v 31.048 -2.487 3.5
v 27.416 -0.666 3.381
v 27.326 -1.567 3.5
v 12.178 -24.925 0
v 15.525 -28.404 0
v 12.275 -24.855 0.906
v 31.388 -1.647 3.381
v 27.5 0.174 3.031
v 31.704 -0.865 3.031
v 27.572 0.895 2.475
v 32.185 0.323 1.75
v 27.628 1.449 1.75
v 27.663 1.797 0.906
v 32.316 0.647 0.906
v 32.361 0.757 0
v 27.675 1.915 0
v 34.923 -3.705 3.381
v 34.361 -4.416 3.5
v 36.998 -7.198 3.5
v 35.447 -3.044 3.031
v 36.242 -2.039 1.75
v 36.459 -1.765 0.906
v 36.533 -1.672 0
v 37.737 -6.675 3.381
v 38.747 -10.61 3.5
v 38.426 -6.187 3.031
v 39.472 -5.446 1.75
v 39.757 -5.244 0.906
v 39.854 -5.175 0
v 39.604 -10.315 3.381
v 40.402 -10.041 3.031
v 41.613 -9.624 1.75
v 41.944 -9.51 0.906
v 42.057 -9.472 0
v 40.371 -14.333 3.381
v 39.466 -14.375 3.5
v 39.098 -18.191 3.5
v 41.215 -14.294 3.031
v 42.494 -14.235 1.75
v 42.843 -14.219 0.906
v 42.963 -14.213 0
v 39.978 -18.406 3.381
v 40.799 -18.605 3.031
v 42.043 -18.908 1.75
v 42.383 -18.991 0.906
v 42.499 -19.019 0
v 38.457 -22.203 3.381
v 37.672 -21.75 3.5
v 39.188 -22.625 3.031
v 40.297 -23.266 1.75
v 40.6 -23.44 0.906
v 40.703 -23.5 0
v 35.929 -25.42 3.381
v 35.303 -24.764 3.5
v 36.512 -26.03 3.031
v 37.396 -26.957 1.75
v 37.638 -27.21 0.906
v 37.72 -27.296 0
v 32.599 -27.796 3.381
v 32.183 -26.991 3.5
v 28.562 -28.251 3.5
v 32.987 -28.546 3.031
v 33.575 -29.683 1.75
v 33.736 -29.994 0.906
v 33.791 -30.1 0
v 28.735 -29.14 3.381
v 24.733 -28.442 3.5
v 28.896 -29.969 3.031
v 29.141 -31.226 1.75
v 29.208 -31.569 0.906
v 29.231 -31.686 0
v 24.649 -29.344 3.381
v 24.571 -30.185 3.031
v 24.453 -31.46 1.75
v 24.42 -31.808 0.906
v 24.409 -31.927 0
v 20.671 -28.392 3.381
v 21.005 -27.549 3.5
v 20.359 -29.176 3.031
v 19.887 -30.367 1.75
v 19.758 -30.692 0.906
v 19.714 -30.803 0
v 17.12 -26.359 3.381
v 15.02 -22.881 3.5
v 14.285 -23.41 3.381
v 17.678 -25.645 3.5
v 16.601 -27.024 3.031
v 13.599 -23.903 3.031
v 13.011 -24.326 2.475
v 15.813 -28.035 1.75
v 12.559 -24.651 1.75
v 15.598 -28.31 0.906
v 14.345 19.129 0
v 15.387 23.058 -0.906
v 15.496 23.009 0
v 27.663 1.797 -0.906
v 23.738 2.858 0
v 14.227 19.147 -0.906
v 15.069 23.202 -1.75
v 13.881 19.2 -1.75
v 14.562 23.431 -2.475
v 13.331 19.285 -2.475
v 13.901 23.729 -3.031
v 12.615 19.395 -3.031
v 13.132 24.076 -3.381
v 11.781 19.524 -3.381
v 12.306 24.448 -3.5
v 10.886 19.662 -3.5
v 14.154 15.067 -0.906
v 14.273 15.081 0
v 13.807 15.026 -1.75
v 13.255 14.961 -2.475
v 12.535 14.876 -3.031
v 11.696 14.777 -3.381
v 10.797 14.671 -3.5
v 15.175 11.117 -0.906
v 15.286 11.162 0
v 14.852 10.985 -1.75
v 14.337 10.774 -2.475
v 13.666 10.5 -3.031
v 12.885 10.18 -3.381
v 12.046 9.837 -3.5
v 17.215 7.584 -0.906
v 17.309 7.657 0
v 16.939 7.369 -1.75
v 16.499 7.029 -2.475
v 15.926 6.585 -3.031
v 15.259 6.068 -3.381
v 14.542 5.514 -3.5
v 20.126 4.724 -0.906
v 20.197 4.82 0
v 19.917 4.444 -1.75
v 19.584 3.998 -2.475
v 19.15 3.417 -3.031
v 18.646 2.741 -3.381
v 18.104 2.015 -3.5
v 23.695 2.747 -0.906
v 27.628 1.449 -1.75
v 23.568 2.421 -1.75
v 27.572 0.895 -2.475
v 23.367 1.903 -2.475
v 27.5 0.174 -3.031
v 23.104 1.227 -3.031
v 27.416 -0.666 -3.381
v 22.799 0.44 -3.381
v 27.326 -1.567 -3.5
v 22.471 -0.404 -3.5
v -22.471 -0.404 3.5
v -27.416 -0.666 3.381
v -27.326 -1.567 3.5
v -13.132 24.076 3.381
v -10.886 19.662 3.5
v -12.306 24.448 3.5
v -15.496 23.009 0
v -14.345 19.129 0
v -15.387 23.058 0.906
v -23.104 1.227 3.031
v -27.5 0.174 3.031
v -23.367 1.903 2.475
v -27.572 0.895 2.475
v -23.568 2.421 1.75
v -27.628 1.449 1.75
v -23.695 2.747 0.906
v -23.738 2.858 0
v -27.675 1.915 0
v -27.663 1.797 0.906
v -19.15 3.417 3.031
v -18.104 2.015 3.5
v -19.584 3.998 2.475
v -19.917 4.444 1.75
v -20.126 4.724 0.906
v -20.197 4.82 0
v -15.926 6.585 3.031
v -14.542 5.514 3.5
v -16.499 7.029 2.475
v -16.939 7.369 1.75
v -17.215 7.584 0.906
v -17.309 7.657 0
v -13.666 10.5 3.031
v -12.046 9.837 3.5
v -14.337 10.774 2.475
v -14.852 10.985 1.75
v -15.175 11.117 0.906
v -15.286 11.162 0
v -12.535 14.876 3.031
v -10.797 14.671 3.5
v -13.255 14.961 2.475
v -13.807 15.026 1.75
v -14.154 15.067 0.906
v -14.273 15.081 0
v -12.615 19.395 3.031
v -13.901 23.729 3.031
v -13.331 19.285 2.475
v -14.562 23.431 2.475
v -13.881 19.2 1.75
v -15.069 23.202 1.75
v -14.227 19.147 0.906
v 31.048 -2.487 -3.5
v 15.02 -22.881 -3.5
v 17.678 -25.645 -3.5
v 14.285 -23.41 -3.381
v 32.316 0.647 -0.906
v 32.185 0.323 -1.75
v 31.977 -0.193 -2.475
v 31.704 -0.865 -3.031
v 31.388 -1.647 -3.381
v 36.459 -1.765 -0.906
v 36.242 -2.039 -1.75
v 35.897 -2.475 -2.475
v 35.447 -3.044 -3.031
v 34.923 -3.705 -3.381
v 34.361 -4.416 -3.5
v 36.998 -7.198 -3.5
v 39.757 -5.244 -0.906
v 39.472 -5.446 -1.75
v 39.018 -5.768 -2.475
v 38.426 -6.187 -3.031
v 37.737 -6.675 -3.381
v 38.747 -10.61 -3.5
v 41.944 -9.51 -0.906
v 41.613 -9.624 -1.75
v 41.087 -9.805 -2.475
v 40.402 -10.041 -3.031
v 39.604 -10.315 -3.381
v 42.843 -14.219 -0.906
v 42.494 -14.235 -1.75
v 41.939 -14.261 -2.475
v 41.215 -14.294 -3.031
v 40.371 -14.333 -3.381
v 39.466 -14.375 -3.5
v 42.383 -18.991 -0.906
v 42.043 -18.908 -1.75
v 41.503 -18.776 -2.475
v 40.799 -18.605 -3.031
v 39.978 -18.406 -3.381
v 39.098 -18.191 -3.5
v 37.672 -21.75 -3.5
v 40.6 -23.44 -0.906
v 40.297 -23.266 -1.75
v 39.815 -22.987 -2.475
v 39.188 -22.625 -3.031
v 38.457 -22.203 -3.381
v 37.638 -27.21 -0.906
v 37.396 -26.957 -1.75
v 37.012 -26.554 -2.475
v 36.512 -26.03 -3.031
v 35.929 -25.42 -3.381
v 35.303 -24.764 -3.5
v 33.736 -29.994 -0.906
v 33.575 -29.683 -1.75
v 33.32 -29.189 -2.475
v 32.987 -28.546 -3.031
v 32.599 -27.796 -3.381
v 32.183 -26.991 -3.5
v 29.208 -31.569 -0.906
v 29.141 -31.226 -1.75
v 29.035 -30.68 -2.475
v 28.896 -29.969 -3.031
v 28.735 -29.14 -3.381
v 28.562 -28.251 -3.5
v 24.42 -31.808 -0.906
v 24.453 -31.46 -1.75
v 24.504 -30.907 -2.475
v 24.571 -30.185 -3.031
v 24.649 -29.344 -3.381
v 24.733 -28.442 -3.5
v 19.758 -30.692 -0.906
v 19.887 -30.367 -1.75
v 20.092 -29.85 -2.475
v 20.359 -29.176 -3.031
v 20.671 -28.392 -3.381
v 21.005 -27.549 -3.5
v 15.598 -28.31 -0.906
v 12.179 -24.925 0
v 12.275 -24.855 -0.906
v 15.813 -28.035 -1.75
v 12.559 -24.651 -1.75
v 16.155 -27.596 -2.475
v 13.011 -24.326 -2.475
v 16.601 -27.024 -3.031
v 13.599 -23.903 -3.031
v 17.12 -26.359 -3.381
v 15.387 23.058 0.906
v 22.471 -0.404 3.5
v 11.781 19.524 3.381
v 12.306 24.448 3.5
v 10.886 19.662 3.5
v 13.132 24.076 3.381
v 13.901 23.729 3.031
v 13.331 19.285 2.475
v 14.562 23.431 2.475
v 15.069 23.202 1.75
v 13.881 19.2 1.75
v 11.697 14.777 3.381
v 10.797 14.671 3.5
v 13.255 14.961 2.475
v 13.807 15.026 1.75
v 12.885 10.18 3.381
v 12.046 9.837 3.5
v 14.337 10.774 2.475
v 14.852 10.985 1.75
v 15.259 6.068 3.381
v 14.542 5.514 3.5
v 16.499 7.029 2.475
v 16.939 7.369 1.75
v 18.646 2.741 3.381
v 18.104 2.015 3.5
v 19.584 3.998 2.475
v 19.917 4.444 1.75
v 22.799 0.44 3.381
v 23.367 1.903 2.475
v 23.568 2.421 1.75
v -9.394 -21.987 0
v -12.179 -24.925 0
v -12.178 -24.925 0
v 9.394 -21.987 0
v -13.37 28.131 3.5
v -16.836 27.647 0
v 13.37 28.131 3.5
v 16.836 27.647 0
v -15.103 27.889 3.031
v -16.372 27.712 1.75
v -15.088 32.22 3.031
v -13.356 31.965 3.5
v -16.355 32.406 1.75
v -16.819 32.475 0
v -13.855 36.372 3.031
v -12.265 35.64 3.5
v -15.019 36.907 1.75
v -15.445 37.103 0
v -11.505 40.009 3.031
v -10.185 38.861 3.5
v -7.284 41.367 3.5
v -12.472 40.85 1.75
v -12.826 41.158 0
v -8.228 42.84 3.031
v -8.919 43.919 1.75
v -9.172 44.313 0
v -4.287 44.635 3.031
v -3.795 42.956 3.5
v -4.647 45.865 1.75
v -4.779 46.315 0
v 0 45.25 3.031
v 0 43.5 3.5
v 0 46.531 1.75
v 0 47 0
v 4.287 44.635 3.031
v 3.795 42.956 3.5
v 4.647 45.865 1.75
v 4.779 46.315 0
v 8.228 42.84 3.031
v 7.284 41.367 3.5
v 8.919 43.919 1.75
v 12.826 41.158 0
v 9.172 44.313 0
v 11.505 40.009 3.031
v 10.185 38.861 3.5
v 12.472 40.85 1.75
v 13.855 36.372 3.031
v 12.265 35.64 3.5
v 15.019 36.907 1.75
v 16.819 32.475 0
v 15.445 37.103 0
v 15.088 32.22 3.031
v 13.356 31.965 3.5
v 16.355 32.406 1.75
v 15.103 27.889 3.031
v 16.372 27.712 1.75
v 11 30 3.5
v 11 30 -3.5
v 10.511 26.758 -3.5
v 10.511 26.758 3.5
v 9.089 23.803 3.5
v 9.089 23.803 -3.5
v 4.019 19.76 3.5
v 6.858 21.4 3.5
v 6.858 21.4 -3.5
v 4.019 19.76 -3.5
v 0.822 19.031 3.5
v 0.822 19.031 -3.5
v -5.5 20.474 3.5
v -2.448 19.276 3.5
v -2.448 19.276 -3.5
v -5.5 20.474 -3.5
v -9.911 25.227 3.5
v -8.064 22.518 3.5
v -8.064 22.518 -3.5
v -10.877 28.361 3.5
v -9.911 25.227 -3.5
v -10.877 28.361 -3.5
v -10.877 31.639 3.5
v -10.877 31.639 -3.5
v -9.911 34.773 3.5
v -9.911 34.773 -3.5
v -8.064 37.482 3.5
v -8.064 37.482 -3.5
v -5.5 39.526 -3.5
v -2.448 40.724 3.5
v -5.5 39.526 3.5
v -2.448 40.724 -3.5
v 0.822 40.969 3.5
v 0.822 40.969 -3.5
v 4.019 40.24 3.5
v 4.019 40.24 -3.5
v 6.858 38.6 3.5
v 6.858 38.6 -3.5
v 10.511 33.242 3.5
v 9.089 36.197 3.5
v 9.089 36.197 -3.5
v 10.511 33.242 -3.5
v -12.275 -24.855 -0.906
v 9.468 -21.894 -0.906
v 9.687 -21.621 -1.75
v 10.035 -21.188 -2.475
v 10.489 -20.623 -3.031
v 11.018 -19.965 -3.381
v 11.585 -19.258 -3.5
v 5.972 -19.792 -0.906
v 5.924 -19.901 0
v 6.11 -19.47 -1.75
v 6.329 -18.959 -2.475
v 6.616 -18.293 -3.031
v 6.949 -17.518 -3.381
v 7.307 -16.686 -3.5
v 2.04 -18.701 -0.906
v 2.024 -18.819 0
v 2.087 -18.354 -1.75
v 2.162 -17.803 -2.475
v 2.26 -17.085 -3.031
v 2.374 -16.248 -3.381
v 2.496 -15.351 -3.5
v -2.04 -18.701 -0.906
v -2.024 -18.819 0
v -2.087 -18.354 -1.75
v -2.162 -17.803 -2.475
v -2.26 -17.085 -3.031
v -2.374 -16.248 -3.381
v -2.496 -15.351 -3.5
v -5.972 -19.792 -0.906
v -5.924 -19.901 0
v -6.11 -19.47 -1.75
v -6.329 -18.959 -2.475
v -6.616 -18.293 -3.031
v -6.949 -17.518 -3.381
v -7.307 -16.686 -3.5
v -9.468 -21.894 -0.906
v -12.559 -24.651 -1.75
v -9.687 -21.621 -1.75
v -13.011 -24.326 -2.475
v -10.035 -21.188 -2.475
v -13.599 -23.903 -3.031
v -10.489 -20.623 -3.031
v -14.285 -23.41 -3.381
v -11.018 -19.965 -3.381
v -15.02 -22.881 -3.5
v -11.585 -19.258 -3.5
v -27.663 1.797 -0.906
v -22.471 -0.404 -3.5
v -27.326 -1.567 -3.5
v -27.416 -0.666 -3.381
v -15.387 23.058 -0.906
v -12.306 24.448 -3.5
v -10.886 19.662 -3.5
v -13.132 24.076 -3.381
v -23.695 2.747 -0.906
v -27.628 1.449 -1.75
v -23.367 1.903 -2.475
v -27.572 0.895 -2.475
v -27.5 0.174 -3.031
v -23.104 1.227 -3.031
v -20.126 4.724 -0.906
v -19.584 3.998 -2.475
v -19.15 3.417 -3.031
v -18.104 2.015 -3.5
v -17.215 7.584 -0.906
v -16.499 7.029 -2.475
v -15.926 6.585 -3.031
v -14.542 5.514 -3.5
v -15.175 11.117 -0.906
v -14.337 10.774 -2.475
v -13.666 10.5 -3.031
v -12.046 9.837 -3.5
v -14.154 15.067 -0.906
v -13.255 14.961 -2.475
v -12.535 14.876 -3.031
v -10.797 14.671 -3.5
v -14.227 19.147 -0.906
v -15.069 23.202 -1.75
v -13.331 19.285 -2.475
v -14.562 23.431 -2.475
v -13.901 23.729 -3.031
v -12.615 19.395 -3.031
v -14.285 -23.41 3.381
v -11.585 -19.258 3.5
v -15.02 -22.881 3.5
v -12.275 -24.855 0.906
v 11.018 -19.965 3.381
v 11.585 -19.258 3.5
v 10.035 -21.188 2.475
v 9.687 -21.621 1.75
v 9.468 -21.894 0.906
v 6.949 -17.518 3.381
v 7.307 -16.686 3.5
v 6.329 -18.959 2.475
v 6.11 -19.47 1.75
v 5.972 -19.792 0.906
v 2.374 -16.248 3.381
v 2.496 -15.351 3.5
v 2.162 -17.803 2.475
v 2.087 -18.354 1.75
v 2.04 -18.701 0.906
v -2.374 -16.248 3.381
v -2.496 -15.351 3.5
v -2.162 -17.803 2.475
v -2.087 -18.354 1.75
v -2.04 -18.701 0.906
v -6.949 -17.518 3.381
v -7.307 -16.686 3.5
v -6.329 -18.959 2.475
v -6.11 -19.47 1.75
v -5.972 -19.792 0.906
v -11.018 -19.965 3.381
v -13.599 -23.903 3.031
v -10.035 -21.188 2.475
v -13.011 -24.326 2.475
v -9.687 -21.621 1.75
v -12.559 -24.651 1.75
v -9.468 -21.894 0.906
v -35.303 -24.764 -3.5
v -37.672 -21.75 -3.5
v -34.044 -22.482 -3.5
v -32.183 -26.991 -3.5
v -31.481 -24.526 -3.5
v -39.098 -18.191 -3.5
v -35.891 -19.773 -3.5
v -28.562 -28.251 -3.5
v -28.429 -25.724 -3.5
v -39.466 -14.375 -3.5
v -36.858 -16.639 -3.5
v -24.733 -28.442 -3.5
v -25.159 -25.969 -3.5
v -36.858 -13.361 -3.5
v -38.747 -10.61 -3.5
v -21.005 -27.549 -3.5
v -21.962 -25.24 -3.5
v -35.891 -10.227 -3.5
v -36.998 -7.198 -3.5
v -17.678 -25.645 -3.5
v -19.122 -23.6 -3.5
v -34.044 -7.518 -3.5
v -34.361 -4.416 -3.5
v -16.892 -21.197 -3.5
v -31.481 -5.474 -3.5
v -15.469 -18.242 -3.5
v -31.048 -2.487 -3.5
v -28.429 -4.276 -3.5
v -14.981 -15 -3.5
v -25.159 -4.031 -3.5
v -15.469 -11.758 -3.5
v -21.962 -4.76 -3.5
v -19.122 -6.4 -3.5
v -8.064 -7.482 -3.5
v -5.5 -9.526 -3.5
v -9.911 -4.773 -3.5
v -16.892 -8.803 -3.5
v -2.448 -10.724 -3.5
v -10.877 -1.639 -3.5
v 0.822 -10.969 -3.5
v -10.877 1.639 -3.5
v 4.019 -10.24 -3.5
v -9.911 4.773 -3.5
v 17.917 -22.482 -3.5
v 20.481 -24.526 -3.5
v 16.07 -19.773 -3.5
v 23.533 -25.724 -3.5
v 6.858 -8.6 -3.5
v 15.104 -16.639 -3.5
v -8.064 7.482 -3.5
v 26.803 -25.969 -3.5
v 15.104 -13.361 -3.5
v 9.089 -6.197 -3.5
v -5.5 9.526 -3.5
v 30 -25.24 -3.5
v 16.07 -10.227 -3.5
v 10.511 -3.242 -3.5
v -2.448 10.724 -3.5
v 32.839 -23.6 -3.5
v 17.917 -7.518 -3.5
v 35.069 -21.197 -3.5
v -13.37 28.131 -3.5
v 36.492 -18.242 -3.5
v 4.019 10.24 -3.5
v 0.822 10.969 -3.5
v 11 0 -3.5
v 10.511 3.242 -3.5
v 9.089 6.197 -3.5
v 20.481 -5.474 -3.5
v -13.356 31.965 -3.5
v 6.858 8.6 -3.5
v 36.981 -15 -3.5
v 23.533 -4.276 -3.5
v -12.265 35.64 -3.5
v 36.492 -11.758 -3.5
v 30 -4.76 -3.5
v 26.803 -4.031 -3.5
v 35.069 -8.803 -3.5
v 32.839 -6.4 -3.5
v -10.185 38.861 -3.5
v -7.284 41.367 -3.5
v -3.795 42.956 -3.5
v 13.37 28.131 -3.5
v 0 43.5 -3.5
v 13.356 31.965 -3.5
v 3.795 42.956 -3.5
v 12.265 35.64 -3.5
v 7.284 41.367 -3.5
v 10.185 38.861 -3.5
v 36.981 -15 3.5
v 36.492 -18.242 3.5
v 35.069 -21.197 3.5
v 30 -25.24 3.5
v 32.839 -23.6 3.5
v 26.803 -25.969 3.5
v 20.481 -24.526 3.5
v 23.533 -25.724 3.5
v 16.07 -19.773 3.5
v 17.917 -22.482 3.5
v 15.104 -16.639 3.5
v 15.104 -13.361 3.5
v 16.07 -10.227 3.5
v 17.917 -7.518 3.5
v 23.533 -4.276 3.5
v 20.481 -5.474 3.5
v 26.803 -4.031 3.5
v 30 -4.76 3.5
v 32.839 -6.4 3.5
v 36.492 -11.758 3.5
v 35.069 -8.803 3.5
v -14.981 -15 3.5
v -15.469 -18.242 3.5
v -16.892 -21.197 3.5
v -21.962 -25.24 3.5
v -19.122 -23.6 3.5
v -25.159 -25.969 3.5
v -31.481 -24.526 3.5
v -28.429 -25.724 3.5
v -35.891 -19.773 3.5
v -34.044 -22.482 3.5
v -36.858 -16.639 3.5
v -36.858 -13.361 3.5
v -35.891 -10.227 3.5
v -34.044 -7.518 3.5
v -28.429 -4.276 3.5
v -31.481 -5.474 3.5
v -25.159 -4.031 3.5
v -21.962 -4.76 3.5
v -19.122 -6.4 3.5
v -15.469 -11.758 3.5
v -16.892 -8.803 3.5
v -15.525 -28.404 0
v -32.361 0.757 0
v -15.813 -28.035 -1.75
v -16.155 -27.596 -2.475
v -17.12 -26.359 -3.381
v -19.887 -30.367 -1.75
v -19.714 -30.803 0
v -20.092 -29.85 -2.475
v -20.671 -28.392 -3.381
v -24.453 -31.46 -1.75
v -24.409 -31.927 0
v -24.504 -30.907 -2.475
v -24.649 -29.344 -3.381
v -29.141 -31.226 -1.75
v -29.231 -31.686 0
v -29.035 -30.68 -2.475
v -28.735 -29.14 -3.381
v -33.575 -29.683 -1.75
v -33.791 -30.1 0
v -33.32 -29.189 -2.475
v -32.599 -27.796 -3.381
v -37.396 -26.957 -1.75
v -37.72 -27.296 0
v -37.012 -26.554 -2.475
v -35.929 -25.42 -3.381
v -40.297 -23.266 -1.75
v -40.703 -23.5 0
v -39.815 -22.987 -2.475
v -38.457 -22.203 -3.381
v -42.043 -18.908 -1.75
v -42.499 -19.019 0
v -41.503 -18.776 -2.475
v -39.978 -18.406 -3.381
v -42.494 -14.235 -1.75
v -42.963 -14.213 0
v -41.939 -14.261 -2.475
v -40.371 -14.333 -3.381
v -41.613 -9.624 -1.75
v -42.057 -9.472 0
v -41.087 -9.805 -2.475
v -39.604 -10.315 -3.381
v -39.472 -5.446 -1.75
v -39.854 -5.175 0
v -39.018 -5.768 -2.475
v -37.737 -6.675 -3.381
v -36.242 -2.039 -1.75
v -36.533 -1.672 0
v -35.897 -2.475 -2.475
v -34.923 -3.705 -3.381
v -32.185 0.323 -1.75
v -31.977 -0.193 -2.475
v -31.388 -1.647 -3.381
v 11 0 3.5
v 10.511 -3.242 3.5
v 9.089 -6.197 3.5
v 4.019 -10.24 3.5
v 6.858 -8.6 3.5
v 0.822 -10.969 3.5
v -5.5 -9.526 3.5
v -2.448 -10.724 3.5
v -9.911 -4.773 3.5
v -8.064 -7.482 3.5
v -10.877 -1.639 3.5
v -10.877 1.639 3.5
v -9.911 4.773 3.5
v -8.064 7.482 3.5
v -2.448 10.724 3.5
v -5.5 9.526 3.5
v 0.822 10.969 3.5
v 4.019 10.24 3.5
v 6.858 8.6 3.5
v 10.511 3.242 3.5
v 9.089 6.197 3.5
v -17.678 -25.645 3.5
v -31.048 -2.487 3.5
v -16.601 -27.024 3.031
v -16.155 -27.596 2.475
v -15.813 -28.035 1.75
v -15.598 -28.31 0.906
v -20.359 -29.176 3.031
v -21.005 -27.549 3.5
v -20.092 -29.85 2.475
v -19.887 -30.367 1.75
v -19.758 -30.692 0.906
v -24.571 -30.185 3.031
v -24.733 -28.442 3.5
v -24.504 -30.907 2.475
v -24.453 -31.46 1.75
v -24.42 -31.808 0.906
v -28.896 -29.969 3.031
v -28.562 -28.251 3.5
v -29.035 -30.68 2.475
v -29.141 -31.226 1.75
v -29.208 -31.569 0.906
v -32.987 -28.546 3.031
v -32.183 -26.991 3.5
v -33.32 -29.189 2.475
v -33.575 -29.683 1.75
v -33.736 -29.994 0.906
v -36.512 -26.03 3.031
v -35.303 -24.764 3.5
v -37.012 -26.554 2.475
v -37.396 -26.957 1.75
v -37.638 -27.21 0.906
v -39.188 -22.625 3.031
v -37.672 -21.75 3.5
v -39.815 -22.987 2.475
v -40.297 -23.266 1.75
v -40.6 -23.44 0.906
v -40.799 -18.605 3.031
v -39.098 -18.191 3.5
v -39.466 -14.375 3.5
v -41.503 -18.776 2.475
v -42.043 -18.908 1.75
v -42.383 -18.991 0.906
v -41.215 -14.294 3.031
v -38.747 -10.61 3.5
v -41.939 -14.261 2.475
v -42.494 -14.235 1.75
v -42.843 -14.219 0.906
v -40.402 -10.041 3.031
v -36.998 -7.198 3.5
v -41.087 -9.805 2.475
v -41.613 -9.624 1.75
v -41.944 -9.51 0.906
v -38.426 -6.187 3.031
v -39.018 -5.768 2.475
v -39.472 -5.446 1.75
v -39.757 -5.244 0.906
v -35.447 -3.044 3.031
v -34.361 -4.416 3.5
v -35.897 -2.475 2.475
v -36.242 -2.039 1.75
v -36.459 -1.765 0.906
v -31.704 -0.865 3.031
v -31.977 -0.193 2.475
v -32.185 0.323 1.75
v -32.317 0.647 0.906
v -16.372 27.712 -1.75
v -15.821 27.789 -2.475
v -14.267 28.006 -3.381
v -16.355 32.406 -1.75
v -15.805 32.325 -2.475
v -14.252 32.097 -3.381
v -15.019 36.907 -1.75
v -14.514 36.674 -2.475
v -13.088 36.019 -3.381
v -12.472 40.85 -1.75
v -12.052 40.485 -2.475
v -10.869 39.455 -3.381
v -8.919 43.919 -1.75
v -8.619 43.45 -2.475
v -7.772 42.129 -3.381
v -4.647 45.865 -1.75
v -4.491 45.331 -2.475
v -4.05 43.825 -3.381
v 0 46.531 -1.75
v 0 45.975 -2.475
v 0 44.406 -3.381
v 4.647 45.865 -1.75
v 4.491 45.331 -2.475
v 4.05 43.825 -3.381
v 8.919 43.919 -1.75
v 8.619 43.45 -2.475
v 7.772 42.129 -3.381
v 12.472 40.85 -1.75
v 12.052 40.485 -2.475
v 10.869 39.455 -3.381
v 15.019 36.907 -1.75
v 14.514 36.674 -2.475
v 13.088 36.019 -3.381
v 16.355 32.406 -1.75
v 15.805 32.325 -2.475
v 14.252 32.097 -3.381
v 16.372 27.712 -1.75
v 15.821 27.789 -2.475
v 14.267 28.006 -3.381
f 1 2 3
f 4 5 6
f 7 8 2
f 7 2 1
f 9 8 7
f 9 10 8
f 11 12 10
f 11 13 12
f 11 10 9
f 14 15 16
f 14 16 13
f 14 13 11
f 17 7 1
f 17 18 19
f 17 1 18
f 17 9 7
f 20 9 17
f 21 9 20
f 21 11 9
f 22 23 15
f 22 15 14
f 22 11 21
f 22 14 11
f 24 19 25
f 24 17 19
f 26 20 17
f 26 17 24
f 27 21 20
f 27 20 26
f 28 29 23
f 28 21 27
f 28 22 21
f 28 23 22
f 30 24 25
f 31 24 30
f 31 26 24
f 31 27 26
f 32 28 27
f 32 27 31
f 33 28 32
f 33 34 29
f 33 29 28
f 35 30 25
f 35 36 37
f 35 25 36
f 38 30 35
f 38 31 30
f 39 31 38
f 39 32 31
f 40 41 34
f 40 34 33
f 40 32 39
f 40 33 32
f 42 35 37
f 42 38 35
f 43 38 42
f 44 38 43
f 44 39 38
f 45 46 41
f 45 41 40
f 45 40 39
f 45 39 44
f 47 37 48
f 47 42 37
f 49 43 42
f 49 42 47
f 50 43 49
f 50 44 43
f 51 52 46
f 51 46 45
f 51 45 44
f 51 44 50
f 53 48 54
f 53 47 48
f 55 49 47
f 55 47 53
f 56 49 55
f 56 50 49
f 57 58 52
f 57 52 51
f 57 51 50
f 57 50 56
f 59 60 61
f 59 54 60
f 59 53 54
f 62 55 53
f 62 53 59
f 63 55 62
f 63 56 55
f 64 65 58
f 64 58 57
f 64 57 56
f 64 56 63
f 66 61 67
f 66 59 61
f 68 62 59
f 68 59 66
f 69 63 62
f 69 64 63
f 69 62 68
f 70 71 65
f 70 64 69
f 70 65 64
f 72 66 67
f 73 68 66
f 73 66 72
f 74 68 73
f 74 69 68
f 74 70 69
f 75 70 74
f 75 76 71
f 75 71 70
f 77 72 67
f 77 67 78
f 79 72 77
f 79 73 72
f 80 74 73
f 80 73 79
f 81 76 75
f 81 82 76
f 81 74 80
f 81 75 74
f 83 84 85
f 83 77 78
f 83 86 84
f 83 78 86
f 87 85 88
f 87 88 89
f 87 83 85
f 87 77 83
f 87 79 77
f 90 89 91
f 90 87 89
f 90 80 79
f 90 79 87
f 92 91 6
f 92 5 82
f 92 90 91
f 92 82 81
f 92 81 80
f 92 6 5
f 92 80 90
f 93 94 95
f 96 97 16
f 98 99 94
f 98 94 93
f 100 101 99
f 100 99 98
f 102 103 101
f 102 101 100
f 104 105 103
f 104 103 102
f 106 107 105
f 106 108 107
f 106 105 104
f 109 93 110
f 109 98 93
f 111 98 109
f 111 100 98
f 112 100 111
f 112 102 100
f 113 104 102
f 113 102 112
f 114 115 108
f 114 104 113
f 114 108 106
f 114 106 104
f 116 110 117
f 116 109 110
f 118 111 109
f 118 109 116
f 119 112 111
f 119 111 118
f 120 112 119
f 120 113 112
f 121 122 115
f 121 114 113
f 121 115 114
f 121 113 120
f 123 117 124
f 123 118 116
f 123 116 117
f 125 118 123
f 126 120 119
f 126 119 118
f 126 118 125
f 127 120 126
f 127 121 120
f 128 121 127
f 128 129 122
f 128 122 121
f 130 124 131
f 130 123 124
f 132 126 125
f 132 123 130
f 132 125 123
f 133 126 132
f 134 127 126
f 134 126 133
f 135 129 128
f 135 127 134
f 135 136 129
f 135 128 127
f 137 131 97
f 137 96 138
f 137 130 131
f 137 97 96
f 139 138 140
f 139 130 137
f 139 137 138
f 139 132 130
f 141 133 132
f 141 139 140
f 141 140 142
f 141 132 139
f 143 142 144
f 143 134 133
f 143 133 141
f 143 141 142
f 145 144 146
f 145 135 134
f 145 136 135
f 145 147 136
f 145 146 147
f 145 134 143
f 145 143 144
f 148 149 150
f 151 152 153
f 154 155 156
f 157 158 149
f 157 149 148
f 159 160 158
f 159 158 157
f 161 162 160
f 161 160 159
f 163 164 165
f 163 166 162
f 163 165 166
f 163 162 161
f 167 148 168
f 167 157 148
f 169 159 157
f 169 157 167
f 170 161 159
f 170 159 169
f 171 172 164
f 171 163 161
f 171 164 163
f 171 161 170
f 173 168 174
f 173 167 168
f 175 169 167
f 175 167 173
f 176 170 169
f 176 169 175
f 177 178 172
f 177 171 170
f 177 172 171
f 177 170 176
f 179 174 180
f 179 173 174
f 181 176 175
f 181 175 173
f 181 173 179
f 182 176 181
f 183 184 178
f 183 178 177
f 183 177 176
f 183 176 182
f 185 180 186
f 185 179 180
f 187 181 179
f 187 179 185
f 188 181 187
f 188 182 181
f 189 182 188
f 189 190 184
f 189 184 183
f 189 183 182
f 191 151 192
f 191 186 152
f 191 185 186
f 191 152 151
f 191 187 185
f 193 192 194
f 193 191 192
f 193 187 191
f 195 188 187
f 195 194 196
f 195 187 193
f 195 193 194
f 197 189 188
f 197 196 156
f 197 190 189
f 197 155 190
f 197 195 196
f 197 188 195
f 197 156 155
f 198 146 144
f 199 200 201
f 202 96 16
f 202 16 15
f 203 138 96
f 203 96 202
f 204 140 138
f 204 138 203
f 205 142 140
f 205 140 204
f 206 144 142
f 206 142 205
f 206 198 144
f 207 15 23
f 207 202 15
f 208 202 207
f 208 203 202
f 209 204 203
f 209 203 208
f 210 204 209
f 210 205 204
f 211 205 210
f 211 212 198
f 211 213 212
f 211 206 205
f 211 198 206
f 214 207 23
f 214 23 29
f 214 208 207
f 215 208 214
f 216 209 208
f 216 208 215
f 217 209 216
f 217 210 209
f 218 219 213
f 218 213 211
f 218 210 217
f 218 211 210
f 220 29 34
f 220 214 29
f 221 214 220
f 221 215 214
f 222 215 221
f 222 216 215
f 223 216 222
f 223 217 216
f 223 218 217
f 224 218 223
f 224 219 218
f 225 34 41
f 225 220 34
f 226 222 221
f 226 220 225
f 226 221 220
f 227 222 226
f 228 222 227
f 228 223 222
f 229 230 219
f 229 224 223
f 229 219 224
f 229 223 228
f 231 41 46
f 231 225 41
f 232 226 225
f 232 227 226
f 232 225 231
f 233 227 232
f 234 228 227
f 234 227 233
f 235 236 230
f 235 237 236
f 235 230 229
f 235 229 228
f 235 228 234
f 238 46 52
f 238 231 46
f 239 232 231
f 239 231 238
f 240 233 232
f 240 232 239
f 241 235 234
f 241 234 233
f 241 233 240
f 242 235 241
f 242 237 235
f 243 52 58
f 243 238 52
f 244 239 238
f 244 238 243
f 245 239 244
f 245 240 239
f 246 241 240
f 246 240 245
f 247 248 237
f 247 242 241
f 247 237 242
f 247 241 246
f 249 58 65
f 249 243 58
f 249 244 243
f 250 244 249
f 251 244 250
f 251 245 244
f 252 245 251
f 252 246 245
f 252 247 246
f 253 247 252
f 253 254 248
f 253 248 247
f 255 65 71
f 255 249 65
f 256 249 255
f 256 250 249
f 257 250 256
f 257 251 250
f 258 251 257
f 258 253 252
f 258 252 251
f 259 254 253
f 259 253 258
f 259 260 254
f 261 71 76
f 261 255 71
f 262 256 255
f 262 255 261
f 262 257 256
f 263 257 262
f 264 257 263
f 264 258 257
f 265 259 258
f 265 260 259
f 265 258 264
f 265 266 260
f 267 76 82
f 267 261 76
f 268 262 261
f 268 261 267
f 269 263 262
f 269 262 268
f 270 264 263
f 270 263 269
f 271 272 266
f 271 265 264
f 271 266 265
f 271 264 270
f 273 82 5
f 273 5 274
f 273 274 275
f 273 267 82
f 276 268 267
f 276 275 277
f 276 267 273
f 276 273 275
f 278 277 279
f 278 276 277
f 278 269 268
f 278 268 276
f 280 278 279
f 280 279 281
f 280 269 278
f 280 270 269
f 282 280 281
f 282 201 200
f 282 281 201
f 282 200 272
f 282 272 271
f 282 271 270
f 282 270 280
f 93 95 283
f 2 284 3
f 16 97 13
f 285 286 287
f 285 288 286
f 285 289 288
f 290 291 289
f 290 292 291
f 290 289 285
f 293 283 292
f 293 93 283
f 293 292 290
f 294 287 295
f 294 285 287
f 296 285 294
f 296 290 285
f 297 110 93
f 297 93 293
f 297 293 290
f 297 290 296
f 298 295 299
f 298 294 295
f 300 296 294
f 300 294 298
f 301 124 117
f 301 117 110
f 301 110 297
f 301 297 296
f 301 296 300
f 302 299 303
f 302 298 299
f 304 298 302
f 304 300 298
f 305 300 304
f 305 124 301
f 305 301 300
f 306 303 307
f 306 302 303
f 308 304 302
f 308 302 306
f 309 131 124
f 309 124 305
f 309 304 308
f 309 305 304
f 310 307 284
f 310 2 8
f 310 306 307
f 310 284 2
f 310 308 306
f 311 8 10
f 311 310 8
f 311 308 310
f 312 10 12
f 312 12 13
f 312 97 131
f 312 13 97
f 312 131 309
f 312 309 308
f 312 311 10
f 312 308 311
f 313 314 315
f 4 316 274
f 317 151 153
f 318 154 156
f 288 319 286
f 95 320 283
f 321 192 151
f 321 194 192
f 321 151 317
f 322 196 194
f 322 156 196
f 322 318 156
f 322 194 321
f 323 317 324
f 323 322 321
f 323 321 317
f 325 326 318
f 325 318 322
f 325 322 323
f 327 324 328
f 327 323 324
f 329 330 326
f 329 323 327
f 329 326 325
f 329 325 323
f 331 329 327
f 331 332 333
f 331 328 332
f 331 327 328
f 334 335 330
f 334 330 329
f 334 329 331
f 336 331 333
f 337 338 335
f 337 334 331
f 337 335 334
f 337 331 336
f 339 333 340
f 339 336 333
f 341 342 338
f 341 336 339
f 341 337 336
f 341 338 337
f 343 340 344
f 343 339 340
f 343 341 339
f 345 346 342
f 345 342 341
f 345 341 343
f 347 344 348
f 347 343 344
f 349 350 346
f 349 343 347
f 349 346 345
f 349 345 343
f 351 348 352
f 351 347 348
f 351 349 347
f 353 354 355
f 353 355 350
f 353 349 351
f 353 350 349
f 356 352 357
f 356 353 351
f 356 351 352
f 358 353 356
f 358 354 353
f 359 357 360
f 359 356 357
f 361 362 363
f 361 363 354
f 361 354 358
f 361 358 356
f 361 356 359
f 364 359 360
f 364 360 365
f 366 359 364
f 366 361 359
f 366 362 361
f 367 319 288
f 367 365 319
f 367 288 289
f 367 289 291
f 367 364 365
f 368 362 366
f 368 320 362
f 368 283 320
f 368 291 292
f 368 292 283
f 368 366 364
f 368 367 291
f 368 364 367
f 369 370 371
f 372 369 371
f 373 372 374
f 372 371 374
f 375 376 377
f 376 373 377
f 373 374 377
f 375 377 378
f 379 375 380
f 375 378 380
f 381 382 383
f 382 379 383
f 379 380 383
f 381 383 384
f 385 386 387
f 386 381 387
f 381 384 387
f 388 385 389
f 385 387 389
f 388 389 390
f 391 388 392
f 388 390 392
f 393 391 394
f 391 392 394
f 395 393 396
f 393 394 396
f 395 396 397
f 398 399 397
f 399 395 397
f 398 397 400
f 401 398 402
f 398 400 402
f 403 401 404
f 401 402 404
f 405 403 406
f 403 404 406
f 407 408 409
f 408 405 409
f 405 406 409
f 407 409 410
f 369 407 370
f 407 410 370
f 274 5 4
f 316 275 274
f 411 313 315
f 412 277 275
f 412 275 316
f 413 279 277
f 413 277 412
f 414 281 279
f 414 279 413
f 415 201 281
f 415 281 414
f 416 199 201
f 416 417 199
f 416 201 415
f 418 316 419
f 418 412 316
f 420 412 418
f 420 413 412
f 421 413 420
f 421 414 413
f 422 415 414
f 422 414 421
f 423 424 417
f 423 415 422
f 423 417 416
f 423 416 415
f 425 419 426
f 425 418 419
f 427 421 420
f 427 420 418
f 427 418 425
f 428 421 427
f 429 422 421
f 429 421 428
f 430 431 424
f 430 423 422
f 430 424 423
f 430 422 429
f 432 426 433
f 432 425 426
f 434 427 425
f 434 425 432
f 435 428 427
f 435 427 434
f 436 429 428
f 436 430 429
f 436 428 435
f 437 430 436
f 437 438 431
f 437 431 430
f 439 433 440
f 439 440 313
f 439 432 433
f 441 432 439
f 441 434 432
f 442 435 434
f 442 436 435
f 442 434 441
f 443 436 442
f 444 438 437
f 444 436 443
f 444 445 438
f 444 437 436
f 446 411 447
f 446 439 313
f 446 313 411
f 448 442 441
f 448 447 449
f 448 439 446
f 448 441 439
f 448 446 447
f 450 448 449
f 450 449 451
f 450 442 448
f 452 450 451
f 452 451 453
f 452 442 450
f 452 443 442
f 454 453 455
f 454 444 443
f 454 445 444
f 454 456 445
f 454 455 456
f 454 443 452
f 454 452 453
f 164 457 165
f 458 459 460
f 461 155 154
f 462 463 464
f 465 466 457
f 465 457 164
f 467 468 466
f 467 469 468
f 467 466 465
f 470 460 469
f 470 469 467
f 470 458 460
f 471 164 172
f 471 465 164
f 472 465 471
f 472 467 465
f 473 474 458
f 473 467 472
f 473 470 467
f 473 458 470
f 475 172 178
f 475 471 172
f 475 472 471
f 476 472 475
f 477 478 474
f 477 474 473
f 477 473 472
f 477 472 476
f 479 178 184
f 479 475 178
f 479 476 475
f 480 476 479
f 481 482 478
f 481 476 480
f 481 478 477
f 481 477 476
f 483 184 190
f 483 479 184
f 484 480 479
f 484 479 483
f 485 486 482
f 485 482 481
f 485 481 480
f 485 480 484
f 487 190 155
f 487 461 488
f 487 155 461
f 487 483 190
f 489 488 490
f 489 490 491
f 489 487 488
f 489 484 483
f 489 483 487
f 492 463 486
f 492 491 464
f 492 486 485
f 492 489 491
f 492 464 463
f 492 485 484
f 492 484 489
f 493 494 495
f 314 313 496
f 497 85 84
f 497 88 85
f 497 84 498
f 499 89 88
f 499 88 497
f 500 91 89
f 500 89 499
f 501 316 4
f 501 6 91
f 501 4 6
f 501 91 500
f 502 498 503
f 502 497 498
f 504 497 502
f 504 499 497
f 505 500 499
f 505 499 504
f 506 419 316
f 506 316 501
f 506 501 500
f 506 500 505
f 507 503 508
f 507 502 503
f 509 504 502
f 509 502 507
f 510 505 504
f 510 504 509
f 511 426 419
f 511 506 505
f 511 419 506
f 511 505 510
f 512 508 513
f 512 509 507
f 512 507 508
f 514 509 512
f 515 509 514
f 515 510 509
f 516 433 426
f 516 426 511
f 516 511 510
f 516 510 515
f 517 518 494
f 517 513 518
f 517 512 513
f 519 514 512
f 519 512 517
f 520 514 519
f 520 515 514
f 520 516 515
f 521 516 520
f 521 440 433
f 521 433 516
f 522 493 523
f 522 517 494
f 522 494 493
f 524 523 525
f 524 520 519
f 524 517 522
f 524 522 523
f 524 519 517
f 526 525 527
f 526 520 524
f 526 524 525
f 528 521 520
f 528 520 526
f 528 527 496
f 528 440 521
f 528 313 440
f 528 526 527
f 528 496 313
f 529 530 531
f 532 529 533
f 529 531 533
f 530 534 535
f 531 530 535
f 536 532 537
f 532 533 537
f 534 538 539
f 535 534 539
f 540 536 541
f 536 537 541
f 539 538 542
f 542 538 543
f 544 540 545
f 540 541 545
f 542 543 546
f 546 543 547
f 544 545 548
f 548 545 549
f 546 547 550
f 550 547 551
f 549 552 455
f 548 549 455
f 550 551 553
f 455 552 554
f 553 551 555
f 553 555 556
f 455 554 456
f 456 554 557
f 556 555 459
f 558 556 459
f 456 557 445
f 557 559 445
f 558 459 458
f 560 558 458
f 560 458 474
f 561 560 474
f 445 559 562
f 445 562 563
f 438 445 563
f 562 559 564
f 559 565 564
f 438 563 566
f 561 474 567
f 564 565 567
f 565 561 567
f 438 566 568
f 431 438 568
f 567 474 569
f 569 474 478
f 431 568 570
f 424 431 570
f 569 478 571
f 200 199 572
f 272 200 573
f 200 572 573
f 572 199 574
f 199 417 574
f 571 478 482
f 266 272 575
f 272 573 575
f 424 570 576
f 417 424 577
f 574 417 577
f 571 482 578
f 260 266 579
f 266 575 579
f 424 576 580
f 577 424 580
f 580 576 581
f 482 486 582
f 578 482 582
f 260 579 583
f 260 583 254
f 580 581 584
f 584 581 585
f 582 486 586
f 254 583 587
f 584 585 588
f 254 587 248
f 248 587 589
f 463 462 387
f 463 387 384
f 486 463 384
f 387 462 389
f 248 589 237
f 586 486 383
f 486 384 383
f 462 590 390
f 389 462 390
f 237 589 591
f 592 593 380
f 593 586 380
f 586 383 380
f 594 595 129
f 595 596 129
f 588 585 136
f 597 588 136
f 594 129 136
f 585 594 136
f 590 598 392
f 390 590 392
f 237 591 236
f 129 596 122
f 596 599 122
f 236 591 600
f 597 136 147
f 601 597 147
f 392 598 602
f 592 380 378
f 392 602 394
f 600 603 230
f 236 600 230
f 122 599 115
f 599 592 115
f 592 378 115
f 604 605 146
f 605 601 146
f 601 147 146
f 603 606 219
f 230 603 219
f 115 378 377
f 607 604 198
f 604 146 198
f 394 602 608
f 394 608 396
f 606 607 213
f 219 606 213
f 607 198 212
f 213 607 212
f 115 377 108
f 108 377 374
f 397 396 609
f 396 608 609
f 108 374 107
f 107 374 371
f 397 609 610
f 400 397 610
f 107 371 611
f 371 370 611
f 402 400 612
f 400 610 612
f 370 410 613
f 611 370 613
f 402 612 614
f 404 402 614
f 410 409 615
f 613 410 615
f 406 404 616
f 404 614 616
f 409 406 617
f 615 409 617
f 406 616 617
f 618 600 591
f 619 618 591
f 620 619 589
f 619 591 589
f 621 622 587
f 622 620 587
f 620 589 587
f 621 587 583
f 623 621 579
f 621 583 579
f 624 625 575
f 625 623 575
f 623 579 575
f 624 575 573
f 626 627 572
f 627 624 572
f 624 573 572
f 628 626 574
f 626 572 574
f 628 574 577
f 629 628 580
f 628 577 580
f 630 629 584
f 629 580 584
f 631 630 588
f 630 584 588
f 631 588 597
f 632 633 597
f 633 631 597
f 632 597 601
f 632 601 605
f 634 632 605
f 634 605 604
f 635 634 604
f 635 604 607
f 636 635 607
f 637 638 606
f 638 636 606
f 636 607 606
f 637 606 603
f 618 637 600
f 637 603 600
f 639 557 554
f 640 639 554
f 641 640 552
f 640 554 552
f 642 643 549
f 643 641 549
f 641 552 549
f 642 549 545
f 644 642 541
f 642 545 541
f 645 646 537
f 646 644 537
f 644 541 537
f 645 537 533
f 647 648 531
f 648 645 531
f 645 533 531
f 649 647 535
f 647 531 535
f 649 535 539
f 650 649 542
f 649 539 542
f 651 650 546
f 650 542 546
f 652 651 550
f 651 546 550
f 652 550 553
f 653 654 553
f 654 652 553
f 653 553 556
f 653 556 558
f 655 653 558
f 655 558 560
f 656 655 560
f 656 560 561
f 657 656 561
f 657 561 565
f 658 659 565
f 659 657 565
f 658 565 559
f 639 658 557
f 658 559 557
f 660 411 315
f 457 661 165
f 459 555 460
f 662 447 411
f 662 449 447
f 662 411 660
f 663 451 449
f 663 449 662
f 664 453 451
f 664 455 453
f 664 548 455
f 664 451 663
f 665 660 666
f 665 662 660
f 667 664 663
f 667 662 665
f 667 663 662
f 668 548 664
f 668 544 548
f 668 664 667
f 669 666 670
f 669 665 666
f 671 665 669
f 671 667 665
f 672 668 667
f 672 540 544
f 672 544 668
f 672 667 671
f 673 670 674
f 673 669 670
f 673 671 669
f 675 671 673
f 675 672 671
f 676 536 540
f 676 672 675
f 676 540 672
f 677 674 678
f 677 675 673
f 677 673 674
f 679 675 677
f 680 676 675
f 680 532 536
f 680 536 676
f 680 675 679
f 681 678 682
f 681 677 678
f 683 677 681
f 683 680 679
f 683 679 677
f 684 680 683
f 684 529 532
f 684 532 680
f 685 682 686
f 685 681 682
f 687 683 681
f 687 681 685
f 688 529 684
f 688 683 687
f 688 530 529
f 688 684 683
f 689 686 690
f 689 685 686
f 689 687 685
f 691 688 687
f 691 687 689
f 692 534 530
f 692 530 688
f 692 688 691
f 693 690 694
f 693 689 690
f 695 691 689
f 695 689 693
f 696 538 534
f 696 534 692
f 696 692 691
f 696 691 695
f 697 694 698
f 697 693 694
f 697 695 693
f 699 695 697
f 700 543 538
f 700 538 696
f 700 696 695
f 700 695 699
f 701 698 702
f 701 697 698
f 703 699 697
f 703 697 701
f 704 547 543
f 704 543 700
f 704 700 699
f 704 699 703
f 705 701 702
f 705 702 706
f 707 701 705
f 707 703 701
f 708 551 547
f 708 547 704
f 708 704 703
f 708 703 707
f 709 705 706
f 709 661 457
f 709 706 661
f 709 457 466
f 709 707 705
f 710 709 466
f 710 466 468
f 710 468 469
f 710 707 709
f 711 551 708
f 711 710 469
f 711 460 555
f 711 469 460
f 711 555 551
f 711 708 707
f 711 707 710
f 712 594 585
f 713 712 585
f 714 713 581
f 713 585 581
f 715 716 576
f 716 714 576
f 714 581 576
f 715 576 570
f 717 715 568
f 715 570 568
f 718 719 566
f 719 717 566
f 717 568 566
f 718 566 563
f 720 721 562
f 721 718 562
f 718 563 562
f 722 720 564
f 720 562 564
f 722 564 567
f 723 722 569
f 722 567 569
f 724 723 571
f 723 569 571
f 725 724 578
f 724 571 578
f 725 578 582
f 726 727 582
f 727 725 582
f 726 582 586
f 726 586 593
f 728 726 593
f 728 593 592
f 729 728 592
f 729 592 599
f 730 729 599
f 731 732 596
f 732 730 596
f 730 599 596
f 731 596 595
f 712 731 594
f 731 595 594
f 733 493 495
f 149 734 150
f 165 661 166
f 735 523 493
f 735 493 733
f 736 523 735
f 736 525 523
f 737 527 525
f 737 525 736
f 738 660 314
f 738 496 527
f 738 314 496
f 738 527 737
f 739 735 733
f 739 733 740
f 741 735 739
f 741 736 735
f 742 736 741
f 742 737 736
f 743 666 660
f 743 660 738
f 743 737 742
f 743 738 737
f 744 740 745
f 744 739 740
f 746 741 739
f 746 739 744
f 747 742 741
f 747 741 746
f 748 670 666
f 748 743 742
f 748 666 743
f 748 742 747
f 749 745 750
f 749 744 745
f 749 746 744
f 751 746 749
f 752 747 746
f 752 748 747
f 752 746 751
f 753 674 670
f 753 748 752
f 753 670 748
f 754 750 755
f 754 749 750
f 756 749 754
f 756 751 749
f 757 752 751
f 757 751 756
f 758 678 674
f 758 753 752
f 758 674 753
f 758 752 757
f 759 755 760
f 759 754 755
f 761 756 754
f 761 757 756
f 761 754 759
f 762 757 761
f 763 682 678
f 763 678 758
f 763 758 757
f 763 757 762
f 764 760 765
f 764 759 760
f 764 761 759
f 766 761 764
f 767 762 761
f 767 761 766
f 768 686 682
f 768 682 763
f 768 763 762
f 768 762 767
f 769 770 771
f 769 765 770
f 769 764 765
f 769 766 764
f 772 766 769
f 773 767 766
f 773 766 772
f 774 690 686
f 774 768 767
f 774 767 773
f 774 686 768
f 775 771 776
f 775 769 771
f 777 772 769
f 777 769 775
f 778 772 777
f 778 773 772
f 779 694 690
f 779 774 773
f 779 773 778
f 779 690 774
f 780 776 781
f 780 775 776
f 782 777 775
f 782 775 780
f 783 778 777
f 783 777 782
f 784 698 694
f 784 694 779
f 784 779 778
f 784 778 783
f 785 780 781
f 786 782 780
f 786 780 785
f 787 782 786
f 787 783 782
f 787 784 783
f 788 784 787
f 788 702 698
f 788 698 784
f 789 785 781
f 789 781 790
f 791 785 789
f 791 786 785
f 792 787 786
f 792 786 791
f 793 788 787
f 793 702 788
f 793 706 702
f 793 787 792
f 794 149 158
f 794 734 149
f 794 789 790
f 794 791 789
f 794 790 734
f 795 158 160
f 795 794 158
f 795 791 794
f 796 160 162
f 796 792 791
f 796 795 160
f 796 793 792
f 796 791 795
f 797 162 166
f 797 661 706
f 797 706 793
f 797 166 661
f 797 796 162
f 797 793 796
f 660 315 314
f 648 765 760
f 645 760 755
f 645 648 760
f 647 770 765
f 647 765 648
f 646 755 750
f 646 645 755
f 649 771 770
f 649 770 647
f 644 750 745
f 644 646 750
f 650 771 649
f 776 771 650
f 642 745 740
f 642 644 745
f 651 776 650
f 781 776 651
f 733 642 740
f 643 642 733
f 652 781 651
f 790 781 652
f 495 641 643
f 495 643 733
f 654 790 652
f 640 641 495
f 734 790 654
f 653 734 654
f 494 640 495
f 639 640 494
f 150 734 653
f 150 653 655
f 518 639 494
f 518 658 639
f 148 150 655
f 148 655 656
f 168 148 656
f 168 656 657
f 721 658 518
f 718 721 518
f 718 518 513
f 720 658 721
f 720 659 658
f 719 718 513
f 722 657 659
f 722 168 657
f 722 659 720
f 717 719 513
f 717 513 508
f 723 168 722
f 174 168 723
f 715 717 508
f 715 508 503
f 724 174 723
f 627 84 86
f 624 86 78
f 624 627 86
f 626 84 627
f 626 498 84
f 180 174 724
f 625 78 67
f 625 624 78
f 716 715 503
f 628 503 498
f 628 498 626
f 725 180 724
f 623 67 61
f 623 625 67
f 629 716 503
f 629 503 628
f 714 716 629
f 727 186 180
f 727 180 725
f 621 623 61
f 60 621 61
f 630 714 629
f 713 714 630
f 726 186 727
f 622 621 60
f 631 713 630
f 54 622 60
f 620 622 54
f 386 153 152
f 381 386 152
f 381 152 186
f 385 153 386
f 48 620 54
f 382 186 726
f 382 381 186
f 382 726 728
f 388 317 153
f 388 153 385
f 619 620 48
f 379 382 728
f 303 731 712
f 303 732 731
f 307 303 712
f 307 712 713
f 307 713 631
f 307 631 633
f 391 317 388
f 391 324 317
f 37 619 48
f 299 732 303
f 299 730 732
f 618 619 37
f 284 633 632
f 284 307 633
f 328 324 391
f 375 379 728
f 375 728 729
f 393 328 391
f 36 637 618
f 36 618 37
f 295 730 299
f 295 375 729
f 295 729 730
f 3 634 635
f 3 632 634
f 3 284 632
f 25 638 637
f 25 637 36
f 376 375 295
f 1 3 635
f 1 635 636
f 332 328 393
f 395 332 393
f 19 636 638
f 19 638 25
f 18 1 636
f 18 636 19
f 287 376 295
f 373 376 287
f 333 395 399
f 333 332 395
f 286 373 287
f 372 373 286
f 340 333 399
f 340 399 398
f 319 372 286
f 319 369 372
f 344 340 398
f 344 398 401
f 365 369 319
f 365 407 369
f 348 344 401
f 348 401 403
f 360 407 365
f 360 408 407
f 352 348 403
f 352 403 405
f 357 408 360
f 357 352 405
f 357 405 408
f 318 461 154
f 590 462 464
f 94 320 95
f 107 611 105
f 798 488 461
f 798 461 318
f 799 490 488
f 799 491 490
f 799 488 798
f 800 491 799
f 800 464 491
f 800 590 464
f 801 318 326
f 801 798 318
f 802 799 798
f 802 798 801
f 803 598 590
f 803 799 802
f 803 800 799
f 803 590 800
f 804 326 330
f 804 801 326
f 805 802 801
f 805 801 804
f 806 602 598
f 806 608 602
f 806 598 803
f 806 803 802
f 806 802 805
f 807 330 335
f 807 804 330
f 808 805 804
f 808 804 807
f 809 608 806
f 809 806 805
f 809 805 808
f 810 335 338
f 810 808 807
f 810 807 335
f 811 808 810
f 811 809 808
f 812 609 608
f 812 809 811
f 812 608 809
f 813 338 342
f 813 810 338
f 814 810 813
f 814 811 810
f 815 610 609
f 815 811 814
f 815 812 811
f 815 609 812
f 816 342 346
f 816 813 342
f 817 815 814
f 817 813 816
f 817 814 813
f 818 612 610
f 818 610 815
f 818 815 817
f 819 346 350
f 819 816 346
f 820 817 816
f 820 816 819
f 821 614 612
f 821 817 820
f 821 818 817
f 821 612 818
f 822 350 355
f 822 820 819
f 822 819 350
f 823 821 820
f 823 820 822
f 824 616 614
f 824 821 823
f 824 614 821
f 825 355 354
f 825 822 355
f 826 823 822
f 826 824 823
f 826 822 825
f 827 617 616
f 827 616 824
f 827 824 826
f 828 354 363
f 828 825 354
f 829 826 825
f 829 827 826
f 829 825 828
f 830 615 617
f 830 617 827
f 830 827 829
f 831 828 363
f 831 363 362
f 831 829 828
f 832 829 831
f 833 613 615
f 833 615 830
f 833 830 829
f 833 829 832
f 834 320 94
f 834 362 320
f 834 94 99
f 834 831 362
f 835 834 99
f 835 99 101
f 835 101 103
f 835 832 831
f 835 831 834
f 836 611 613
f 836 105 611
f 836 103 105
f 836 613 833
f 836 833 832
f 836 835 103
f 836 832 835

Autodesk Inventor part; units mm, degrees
ref_plane "YZ Plane" through (0, 0, 0) normal (1, 0, 0) x (0, 1, 0)
ref_plane "XZ Plane" through (0, 0, 0) normal (0, 1, 0) x (-1, 0, 0)
ref_plane "XY Plane" through (0, 0, 0) normal (0, 0, 1) x (1, 0, 0)
sketch "Sketch1" plane through (0, 0, 0) normal (0, 0, 1) x (1, 0, 0)
  circle A0 centre (0, 0) radius 11
  circle A1 centre (0, 30) radius 11
  circle A2 centre (-25.9808, -15) radius 11
  circle A3 centre (25.9808, -15) radius 11
  circle A4 centre (25.9808, -15) radius 17
  circle A5 centre (-25.9808, -15) radius 17
  circle A6 centre (0, 30) radius 17
  arc A7 (-27.6746, 1.9154) -> (-15.4961, 23.0092) centre (-29.1691, 16.8408) ccw
  arc A8 (15.4961, 23.0092) -> (27.6746, 1.9154) centre (29.1691, 16.8408) ccw
  arc A9 (12.1785, -24.9246) -> (-12.1785, -24.9246) centre (0, -33.6815) ccw
  dimension "d0" = 22
  dimension "d1" = 22
  dimension "d2" = 30
  dimension "d5" = 360
  dimension "d8" = 6
  dimension "d9" = 6
  dimension "d10" = 6
  dimension "d11" = 15
  dimension "d12" = 15
  dimension "d13" = 15
extrude "Extrusion1" add sketch "Sketch1" along normal mid plane 7
full round fillet "Full Round Fillet1" first side at (17.2542, -0.5688, 3.5) centre faces at (10.4882, 43.379, 1.1667) second side at (17.2542, -0.5688, -3.5)
equation "\"d12\" = d11"
equation "\"d13\" = d11"
properties part number "Exam 3_03-30-2022 Leo Berman" material "Aluminum 6061"
